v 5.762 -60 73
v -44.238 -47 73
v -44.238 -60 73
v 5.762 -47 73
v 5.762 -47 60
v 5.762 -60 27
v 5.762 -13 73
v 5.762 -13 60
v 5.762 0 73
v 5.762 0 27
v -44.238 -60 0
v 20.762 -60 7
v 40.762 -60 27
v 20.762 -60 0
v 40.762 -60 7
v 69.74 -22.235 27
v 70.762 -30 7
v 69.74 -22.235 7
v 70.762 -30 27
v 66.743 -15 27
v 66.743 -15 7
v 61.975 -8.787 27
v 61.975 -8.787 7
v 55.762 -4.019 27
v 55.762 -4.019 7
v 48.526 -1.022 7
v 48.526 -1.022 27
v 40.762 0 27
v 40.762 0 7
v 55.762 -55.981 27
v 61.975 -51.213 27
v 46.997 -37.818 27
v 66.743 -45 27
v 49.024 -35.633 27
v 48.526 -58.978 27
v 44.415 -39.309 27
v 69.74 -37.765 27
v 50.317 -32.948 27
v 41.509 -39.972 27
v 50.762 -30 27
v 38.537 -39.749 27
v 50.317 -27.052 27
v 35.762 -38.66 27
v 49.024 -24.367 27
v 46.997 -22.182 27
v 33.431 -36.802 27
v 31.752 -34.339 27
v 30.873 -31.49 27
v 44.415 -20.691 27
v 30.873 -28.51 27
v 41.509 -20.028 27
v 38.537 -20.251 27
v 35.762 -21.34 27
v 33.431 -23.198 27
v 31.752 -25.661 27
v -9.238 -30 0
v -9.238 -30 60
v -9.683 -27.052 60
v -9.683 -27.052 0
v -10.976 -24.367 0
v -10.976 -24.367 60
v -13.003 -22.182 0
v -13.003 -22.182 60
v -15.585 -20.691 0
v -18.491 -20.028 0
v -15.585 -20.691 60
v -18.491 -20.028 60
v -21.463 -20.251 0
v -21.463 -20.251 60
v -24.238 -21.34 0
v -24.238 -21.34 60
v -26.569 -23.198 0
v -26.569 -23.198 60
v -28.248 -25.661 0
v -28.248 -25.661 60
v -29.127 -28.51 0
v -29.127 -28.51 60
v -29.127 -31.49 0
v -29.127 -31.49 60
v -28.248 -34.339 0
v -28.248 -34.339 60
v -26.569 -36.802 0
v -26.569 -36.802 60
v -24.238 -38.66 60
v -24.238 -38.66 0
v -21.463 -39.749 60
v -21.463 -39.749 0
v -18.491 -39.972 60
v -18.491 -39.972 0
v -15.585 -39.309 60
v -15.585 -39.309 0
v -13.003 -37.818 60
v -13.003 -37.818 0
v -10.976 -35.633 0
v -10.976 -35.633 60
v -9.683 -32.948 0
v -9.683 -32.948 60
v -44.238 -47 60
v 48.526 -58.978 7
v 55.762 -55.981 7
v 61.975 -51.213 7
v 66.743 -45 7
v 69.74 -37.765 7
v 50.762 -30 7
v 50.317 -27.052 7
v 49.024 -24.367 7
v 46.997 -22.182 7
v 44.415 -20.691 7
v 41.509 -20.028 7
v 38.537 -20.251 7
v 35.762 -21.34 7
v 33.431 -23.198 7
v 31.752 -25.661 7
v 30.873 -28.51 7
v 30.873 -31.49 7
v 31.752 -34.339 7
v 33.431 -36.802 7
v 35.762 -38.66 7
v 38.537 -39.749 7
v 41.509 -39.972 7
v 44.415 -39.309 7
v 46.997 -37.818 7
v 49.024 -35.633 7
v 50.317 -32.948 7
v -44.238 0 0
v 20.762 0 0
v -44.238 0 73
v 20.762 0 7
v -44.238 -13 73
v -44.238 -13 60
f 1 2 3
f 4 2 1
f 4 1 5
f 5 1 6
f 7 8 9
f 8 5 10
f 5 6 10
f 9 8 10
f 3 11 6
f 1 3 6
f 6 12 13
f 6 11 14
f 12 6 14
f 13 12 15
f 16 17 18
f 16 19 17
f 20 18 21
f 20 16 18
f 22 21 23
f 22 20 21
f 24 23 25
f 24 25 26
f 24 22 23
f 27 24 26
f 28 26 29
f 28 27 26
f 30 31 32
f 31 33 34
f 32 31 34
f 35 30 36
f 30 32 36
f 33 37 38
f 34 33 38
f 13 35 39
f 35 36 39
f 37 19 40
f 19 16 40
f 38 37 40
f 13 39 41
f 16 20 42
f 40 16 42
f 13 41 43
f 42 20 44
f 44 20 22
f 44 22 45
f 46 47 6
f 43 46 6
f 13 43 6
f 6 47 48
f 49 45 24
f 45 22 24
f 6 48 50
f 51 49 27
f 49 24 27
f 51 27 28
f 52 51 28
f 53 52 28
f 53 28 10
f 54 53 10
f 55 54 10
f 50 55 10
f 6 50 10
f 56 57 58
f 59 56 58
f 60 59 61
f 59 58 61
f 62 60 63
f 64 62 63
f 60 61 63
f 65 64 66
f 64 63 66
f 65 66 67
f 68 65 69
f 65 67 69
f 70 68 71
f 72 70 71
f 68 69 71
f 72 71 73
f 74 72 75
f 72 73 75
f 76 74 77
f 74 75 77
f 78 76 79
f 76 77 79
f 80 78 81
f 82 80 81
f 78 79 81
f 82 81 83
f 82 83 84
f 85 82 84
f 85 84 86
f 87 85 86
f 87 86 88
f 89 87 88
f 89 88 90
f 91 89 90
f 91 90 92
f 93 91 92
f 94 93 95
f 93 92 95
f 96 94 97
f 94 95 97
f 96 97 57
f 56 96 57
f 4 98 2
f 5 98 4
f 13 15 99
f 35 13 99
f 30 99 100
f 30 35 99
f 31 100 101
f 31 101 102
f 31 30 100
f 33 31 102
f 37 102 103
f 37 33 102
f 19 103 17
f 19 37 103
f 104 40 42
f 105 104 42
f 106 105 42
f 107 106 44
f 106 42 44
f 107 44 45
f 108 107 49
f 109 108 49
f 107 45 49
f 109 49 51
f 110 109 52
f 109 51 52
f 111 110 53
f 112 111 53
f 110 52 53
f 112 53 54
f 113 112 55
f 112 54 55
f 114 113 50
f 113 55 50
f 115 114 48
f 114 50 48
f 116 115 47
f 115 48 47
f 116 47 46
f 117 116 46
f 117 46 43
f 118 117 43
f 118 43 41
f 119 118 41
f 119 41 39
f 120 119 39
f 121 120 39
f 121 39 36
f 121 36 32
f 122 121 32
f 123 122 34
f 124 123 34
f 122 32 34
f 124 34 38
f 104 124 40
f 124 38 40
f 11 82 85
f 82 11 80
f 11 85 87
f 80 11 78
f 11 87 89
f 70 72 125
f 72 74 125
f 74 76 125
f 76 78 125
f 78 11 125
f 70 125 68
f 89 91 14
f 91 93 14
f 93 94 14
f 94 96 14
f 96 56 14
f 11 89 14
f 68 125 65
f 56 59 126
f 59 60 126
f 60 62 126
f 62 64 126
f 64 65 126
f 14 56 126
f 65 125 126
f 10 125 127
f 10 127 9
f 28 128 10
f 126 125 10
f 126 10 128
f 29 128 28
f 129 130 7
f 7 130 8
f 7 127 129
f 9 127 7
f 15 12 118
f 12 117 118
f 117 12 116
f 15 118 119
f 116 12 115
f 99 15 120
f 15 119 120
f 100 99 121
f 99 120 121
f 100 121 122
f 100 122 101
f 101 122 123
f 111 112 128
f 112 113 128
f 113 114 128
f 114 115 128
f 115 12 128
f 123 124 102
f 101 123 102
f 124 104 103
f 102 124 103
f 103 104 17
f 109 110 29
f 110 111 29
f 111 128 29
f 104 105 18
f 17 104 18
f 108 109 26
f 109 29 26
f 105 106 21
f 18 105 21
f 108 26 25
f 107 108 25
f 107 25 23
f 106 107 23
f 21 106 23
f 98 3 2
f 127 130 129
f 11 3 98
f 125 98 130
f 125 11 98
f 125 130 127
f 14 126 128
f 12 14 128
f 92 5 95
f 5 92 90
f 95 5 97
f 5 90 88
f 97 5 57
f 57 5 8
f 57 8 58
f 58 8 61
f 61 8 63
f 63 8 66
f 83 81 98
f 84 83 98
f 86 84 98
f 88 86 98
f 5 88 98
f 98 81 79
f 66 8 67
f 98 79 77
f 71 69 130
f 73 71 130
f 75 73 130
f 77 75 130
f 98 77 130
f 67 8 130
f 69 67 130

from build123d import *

# Parameters (mm, degrees)
F1_DEPTH  = 60
F2_W      = 50
F2_H      = 13
F3_DEPTH  = 13
F4_W      = 50
F4_H      = 13
F5_DEPTH  = 13
F6_R      = 29.99999
F7_R      = 10
F9_DEPTH  = 20
F8_R      = 10
F10_DEPTH = 60


# Not quite as in the source:
# - a fillet or chamfer is up to 0.001 mm smaller than in the source, because OpenCascade refuses the exact size


with BuildPart() as f1:
    # F0 (on Front) → F1 (new body)
    with BuildSketch(Plane.XZ):
        Polygon((-44.2382382879, 60), (-44.2382382879, 0), (20.7617617121, 0), (20.7617617121, 7), (70.7617617121, 7), (70.7617617121, 27), (5.7617617121, 27), (5.7617617121, 60), align=None)
    extrude(amount=F1_DEPTH)

    # F2 (on face) → F3 (join)
    with BuildSketch(Plane.XY.offset(60)):
        with Locations((-19.2382382879, -6.5)):
            Rectangle(F2_W, F2_H)
    extrude(amount=F3_DEPTH)

    # F4 (on face) → F5 (join)
    with BuildSketch(Plane.XY.offset(60)):
        with Locations((-19.2382382879, -53.5)):
            Rectangle(F4_W, F4_H)
    extrude(amount=F5_DEPTH)

    # F6 (radius 30 in the source; OpenCascade refuses exactly that, so slightly less here)
    f6_edges = [f1.edges().sort_by_distance(p)[0] for p in [
        (70.761762, -60, 17),
        (70.761762, 0, 17),
    ]]
    fillet(f6_edges, radius=F6_R)

    # F7 (on face) → F9 (cut)
    with BuildSketch(Plane.XY.offset(27)):
        with Locations((40.7617617121, -30)):
            Circle(F7_R)
    extrude(amount=-F9_DEPTH, mode=Mode.SUBTRACT)

    # F8 (on face) → F10 (cut)
    with BuildSketch(Plane.XY.offset(60)):
        with Locations((-19.2382382879, -30)):
            Circle(F8_R)
    extrude(amount=-F10_DEPTH, mode=Mode.SUBTRACT)


solid = f1.part
